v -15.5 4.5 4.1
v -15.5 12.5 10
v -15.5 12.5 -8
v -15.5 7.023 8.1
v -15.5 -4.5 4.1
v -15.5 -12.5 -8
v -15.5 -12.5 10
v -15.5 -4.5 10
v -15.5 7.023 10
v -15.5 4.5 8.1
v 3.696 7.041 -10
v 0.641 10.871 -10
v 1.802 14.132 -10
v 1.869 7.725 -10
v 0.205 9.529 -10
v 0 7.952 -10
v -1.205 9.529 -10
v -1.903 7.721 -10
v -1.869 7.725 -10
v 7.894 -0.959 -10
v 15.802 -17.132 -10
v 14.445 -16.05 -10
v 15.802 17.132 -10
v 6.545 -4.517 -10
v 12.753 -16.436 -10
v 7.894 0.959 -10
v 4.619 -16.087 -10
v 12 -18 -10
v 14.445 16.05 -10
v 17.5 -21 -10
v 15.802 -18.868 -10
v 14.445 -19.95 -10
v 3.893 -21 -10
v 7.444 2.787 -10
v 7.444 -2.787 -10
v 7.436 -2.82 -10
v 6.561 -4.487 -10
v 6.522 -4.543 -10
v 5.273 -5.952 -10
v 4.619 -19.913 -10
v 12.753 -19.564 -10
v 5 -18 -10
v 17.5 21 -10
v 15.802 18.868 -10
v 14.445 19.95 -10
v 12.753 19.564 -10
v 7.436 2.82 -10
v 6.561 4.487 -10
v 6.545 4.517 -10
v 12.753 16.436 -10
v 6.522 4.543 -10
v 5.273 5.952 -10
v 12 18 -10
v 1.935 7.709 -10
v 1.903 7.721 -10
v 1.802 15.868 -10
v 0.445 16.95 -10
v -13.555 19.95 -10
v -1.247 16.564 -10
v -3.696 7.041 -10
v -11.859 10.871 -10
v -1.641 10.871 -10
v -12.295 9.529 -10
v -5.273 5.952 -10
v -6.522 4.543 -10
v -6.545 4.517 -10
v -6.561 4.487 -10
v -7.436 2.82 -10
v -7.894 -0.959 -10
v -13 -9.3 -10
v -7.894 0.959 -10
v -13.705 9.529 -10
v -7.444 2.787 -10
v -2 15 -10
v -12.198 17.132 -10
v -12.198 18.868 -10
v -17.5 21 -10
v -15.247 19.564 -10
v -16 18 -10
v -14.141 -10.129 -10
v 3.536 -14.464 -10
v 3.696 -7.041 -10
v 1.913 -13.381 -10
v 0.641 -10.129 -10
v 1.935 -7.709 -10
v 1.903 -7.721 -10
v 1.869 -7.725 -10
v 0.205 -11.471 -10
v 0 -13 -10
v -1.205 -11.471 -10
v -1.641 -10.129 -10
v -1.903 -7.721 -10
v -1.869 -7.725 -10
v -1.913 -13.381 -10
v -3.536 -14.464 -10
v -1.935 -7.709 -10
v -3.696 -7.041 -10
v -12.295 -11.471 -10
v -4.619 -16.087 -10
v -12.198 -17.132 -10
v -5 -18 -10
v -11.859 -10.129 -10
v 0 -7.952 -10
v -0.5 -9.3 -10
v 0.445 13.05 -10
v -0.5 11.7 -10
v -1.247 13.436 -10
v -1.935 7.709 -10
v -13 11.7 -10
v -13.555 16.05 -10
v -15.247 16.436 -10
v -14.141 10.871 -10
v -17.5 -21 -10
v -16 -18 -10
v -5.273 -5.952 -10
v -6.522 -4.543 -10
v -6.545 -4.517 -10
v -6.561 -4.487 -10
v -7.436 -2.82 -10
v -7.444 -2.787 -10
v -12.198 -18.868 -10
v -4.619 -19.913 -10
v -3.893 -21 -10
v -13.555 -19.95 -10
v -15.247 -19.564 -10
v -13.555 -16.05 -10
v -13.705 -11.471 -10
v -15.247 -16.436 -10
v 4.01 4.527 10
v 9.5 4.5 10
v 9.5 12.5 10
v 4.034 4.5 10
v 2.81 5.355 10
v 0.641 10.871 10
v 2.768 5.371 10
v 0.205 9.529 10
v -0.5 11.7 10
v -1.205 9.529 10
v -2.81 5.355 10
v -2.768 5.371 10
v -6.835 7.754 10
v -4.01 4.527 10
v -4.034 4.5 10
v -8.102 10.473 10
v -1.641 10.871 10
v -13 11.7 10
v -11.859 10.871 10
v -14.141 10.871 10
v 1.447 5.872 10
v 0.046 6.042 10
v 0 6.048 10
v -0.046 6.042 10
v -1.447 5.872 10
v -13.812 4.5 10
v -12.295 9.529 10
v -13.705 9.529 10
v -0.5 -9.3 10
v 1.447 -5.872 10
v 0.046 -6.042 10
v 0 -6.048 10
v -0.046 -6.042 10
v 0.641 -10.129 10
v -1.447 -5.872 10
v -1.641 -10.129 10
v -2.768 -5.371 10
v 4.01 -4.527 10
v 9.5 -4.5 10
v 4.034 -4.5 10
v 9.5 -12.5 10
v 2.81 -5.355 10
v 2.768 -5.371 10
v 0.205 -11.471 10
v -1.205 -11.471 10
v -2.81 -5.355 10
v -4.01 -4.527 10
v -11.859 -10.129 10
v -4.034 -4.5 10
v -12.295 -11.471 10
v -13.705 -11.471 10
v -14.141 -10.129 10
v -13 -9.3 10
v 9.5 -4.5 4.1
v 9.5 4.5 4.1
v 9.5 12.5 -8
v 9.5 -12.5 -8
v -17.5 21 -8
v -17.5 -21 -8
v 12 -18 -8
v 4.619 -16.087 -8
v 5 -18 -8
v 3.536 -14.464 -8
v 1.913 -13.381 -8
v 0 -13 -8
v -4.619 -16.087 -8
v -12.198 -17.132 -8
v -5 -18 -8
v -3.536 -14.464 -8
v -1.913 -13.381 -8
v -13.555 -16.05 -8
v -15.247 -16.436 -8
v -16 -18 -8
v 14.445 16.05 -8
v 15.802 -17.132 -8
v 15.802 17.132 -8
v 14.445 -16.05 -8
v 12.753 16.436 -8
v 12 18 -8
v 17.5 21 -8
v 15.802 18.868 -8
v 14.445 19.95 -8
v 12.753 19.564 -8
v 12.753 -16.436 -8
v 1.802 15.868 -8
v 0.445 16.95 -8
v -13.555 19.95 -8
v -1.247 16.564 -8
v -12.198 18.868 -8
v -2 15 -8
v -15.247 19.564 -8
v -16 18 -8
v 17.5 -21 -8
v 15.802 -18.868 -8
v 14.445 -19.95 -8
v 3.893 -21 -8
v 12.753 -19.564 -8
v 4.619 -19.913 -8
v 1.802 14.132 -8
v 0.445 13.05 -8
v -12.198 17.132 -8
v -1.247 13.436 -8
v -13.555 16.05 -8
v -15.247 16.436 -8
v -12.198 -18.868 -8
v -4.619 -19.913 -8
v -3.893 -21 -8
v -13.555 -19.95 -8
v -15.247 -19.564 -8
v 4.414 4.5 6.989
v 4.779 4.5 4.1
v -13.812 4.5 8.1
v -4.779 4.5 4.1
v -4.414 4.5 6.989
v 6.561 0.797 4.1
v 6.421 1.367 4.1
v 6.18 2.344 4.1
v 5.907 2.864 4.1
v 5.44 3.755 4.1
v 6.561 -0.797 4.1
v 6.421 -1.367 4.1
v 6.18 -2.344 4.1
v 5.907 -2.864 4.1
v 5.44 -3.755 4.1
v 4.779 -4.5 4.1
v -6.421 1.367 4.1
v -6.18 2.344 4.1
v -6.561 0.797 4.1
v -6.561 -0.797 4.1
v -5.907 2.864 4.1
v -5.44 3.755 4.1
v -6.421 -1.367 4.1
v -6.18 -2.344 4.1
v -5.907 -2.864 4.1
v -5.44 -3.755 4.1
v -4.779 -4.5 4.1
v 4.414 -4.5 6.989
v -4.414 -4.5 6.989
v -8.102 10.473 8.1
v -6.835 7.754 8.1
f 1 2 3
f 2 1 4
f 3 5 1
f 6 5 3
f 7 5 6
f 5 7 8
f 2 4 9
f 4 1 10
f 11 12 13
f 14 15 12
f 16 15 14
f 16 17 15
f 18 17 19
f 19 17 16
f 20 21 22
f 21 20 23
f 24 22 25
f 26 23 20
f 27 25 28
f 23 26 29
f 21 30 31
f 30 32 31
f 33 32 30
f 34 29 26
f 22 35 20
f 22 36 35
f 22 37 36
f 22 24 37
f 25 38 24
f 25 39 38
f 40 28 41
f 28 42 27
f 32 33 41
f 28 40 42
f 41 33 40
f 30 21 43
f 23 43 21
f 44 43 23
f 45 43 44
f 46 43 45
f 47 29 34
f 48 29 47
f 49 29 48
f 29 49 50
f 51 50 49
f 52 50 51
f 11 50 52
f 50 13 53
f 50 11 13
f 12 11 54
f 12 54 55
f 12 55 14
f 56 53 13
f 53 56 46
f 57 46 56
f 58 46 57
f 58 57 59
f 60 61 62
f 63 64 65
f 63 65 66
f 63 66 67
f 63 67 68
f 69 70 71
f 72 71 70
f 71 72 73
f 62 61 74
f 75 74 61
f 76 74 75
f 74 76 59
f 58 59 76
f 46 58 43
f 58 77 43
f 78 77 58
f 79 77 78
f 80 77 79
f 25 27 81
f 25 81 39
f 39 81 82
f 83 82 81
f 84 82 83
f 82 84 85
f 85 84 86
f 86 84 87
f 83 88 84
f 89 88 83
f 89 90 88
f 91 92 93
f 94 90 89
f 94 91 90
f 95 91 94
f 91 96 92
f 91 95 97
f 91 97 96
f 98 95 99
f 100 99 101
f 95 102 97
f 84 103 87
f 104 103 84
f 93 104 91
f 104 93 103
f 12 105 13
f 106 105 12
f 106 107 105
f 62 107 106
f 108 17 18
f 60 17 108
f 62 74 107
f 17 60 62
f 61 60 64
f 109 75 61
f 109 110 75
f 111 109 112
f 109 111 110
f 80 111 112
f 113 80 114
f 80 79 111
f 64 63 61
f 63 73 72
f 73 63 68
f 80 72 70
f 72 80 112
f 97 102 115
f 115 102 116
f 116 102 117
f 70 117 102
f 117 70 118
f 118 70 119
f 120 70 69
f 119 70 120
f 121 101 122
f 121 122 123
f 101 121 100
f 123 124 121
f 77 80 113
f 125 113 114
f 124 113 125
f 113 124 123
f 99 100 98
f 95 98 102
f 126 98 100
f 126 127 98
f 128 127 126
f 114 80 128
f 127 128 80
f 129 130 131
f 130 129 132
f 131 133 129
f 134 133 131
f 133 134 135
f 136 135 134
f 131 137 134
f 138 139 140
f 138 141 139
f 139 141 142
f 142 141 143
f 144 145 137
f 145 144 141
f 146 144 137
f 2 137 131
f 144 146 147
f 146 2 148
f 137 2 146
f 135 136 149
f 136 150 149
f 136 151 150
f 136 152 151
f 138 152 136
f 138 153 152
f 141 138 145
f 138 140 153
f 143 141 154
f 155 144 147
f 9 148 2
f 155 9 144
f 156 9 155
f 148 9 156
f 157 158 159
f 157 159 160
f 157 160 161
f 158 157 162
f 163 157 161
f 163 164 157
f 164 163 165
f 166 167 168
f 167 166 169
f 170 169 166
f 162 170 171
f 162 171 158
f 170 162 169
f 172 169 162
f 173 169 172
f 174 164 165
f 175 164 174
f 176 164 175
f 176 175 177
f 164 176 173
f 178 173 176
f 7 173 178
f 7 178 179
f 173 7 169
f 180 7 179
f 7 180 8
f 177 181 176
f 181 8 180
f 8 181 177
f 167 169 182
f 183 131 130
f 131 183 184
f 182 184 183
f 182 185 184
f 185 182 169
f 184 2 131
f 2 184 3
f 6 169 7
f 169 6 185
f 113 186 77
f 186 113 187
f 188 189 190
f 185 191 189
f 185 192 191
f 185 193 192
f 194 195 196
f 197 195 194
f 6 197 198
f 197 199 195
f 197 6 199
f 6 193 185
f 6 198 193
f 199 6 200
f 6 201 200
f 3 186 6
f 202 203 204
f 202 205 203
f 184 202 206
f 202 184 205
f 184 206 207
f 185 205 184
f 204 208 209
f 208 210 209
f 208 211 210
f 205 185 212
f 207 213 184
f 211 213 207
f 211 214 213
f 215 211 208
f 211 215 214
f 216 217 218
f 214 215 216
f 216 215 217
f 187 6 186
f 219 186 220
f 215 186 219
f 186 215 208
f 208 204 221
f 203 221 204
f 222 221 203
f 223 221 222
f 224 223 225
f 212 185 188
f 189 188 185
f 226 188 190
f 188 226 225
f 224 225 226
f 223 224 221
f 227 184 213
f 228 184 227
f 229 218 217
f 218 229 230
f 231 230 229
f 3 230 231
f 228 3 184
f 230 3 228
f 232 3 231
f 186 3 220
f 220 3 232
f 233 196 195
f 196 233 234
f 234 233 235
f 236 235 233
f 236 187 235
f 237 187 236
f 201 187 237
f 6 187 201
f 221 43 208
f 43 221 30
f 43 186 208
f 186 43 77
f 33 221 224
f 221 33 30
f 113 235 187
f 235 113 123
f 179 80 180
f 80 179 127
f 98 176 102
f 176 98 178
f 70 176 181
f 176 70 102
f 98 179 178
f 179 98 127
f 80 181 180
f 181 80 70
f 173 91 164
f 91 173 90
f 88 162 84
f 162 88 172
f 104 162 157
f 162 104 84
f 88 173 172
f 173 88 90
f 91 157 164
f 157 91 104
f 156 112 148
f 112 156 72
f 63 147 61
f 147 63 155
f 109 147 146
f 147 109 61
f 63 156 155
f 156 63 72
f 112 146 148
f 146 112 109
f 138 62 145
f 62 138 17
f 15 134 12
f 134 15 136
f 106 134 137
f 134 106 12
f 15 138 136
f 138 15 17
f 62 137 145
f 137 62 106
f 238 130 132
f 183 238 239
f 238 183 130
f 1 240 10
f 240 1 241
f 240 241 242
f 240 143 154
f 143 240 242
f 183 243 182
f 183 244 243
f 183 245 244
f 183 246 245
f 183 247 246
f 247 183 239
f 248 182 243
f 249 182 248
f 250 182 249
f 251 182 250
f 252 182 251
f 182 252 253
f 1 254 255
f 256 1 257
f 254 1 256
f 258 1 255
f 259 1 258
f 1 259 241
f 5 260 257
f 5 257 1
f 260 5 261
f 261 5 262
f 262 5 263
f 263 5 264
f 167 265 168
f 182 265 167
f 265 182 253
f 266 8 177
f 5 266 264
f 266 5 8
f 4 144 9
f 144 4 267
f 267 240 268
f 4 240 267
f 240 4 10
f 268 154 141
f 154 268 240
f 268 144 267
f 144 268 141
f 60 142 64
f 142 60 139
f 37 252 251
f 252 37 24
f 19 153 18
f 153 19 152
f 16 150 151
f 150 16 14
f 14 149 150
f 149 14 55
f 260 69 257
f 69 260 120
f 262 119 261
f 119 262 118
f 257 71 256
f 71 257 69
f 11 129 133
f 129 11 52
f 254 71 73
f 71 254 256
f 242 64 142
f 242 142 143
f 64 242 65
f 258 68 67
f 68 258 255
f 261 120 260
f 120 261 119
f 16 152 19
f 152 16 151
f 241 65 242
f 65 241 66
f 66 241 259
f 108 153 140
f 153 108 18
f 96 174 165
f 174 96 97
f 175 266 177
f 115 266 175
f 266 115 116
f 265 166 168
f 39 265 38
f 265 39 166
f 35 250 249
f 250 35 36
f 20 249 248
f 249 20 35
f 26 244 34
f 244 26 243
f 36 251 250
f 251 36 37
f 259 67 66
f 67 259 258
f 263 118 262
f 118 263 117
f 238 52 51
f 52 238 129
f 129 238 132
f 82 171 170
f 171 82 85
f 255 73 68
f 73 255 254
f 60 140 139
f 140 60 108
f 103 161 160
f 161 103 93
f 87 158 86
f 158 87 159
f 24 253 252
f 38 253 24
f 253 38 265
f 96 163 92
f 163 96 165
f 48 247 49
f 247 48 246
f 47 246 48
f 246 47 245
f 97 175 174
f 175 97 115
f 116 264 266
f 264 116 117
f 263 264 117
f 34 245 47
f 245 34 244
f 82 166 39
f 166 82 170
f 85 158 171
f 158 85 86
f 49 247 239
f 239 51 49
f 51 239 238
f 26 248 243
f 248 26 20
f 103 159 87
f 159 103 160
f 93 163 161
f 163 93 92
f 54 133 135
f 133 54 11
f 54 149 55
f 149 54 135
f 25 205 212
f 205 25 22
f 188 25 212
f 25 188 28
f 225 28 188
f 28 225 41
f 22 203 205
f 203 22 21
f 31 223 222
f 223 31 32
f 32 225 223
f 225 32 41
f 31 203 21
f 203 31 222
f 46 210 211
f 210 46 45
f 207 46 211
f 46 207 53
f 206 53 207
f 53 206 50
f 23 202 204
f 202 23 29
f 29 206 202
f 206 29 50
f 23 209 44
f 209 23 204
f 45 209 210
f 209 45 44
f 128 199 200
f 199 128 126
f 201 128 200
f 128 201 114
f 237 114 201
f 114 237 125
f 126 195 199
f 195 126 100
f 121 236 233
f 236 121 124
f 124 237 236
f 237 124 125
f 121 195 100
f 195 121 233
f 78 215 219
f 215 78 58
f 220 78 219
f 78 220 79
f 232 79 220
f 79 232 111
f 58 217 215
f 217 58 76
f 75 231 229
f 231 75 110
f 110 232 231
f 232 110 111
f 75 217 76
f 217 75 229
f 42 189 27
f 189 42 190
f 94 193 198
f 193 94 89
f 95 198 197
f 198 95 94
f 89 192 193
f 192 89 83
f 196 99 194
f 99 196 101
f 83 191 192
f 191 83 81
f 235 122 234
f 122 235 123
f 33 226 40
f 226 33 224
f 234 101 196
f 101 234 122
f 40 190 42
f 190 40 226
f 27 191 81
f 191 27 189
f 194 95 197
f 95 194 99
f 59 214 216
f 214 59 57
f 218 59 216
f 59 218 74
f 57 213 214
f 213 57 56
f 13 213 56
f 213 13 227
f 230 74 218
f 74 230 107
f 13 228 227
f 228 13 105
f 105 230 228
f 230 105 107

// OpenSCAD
module picam(){difference(){
    cube([25,24,1],center=true);
    for(i=[2,14.5])
        for(j=[21/2,-21/2])
            translate([j,-25/2+i,-5])
                cylinder(r=1,$fn=20,h=10);
}
translate([25/2-4-8.5,24/2-4-5.5,3])cube([8,8,5],center=true);

}


module pyramid(dims, zstep=0.5){
    for(i=[1:len(dims)]){
        translate([0,0,-len(dims)*zstep+i*zstep+0.01])cube([dims[i-1]+.5,dims[i-1]+.5,zstep+0.01],true);
    }
}

*pyramid([3,5,7,10,12,14]);

*difference(){
    render()union(){
        cube([160,50,20],true);
        translate([0,23.8,10.9])           rotate([60,0,0])            cube([160,6,3],true);
    }
    
    translate([0,-17,0])rotate(45)cylinder(r=4,h=60,center=true,$fn=4);
    translate([0,0,-5])rotate([0,0,22.5])cylinder(r1=8,r2=14,h=10.5,center=true,$fn=8);
    translate([0,15,0])cylinder(r=1.5,h=30,center=true);
    for(i=[-1,1])for(j=[-1,1])translate([i*14,j*18,0])cylinder(r=1.5,h=30,center=true);
    translate([-32.5,-9,0])cube(28.5,true);
    for(i=[1,0,-1])rotate([0,0,180-i*180])translate([i*55,7,0])rotate([90,0,0])rotate([0,0,22.5]){cylinder(r=8/2,$fn=8,h=60,center=true);
    cylinder(r=5/2,$fn=8,h=70);
    }
    translate([0,0,5])cylinder(r=17,h=10.1,center=true);
    for(k=[0,1])translate([k*-95,0,0]){for(i=[0:3])translate([24+i*15.5,25-10,9.9])pyramid([3,5,7,10,12,14]);
    for(i=[2,1])translate([2.5+i*1.5*20,25-34,9.9]){pyramid([20,24,28]);
        for(j=[0,1]){translate([-5+j*10,-5+j*10,-1.49])pyramid([3.5,5,7,9]);
            translate([j*10-5,-j*10+5,-1.49])pyramid([2,4,6,8]);
        }
            
    }
    }
}

rotate([0,180,0])difference(){
union(){
    translate([3,0,0])cube([25,25,20],true);
    translate([0,0,9])cube([35,42,2],true);

}
translate([0,-18,0])rotate(45)cylinder(r=5,h=60,center=true);
translate([0,15,0])cylinder(r=2,h=30,center=true);
rotate(90){
%translate([0,-2.5,-10.5])picam();
for(i=[-1,1])for(j=[-1,1])translate([i*10.5,-6.75+j*6.25,0])cylinder(r=1.2,h=40,center=true);
translate([0,0,-7.1])cube([9,40,6],true);
translate([7,-12,-9.1])rotate(-25)cube([3,10,2],true);
cylinder(r1=6,r2=8,h=21,center=true);
}
for(i=[-1,1])for(j=[-1,1])translate([i*14,j*18,0])cylinder(r=2,h=30,center=true);

}
